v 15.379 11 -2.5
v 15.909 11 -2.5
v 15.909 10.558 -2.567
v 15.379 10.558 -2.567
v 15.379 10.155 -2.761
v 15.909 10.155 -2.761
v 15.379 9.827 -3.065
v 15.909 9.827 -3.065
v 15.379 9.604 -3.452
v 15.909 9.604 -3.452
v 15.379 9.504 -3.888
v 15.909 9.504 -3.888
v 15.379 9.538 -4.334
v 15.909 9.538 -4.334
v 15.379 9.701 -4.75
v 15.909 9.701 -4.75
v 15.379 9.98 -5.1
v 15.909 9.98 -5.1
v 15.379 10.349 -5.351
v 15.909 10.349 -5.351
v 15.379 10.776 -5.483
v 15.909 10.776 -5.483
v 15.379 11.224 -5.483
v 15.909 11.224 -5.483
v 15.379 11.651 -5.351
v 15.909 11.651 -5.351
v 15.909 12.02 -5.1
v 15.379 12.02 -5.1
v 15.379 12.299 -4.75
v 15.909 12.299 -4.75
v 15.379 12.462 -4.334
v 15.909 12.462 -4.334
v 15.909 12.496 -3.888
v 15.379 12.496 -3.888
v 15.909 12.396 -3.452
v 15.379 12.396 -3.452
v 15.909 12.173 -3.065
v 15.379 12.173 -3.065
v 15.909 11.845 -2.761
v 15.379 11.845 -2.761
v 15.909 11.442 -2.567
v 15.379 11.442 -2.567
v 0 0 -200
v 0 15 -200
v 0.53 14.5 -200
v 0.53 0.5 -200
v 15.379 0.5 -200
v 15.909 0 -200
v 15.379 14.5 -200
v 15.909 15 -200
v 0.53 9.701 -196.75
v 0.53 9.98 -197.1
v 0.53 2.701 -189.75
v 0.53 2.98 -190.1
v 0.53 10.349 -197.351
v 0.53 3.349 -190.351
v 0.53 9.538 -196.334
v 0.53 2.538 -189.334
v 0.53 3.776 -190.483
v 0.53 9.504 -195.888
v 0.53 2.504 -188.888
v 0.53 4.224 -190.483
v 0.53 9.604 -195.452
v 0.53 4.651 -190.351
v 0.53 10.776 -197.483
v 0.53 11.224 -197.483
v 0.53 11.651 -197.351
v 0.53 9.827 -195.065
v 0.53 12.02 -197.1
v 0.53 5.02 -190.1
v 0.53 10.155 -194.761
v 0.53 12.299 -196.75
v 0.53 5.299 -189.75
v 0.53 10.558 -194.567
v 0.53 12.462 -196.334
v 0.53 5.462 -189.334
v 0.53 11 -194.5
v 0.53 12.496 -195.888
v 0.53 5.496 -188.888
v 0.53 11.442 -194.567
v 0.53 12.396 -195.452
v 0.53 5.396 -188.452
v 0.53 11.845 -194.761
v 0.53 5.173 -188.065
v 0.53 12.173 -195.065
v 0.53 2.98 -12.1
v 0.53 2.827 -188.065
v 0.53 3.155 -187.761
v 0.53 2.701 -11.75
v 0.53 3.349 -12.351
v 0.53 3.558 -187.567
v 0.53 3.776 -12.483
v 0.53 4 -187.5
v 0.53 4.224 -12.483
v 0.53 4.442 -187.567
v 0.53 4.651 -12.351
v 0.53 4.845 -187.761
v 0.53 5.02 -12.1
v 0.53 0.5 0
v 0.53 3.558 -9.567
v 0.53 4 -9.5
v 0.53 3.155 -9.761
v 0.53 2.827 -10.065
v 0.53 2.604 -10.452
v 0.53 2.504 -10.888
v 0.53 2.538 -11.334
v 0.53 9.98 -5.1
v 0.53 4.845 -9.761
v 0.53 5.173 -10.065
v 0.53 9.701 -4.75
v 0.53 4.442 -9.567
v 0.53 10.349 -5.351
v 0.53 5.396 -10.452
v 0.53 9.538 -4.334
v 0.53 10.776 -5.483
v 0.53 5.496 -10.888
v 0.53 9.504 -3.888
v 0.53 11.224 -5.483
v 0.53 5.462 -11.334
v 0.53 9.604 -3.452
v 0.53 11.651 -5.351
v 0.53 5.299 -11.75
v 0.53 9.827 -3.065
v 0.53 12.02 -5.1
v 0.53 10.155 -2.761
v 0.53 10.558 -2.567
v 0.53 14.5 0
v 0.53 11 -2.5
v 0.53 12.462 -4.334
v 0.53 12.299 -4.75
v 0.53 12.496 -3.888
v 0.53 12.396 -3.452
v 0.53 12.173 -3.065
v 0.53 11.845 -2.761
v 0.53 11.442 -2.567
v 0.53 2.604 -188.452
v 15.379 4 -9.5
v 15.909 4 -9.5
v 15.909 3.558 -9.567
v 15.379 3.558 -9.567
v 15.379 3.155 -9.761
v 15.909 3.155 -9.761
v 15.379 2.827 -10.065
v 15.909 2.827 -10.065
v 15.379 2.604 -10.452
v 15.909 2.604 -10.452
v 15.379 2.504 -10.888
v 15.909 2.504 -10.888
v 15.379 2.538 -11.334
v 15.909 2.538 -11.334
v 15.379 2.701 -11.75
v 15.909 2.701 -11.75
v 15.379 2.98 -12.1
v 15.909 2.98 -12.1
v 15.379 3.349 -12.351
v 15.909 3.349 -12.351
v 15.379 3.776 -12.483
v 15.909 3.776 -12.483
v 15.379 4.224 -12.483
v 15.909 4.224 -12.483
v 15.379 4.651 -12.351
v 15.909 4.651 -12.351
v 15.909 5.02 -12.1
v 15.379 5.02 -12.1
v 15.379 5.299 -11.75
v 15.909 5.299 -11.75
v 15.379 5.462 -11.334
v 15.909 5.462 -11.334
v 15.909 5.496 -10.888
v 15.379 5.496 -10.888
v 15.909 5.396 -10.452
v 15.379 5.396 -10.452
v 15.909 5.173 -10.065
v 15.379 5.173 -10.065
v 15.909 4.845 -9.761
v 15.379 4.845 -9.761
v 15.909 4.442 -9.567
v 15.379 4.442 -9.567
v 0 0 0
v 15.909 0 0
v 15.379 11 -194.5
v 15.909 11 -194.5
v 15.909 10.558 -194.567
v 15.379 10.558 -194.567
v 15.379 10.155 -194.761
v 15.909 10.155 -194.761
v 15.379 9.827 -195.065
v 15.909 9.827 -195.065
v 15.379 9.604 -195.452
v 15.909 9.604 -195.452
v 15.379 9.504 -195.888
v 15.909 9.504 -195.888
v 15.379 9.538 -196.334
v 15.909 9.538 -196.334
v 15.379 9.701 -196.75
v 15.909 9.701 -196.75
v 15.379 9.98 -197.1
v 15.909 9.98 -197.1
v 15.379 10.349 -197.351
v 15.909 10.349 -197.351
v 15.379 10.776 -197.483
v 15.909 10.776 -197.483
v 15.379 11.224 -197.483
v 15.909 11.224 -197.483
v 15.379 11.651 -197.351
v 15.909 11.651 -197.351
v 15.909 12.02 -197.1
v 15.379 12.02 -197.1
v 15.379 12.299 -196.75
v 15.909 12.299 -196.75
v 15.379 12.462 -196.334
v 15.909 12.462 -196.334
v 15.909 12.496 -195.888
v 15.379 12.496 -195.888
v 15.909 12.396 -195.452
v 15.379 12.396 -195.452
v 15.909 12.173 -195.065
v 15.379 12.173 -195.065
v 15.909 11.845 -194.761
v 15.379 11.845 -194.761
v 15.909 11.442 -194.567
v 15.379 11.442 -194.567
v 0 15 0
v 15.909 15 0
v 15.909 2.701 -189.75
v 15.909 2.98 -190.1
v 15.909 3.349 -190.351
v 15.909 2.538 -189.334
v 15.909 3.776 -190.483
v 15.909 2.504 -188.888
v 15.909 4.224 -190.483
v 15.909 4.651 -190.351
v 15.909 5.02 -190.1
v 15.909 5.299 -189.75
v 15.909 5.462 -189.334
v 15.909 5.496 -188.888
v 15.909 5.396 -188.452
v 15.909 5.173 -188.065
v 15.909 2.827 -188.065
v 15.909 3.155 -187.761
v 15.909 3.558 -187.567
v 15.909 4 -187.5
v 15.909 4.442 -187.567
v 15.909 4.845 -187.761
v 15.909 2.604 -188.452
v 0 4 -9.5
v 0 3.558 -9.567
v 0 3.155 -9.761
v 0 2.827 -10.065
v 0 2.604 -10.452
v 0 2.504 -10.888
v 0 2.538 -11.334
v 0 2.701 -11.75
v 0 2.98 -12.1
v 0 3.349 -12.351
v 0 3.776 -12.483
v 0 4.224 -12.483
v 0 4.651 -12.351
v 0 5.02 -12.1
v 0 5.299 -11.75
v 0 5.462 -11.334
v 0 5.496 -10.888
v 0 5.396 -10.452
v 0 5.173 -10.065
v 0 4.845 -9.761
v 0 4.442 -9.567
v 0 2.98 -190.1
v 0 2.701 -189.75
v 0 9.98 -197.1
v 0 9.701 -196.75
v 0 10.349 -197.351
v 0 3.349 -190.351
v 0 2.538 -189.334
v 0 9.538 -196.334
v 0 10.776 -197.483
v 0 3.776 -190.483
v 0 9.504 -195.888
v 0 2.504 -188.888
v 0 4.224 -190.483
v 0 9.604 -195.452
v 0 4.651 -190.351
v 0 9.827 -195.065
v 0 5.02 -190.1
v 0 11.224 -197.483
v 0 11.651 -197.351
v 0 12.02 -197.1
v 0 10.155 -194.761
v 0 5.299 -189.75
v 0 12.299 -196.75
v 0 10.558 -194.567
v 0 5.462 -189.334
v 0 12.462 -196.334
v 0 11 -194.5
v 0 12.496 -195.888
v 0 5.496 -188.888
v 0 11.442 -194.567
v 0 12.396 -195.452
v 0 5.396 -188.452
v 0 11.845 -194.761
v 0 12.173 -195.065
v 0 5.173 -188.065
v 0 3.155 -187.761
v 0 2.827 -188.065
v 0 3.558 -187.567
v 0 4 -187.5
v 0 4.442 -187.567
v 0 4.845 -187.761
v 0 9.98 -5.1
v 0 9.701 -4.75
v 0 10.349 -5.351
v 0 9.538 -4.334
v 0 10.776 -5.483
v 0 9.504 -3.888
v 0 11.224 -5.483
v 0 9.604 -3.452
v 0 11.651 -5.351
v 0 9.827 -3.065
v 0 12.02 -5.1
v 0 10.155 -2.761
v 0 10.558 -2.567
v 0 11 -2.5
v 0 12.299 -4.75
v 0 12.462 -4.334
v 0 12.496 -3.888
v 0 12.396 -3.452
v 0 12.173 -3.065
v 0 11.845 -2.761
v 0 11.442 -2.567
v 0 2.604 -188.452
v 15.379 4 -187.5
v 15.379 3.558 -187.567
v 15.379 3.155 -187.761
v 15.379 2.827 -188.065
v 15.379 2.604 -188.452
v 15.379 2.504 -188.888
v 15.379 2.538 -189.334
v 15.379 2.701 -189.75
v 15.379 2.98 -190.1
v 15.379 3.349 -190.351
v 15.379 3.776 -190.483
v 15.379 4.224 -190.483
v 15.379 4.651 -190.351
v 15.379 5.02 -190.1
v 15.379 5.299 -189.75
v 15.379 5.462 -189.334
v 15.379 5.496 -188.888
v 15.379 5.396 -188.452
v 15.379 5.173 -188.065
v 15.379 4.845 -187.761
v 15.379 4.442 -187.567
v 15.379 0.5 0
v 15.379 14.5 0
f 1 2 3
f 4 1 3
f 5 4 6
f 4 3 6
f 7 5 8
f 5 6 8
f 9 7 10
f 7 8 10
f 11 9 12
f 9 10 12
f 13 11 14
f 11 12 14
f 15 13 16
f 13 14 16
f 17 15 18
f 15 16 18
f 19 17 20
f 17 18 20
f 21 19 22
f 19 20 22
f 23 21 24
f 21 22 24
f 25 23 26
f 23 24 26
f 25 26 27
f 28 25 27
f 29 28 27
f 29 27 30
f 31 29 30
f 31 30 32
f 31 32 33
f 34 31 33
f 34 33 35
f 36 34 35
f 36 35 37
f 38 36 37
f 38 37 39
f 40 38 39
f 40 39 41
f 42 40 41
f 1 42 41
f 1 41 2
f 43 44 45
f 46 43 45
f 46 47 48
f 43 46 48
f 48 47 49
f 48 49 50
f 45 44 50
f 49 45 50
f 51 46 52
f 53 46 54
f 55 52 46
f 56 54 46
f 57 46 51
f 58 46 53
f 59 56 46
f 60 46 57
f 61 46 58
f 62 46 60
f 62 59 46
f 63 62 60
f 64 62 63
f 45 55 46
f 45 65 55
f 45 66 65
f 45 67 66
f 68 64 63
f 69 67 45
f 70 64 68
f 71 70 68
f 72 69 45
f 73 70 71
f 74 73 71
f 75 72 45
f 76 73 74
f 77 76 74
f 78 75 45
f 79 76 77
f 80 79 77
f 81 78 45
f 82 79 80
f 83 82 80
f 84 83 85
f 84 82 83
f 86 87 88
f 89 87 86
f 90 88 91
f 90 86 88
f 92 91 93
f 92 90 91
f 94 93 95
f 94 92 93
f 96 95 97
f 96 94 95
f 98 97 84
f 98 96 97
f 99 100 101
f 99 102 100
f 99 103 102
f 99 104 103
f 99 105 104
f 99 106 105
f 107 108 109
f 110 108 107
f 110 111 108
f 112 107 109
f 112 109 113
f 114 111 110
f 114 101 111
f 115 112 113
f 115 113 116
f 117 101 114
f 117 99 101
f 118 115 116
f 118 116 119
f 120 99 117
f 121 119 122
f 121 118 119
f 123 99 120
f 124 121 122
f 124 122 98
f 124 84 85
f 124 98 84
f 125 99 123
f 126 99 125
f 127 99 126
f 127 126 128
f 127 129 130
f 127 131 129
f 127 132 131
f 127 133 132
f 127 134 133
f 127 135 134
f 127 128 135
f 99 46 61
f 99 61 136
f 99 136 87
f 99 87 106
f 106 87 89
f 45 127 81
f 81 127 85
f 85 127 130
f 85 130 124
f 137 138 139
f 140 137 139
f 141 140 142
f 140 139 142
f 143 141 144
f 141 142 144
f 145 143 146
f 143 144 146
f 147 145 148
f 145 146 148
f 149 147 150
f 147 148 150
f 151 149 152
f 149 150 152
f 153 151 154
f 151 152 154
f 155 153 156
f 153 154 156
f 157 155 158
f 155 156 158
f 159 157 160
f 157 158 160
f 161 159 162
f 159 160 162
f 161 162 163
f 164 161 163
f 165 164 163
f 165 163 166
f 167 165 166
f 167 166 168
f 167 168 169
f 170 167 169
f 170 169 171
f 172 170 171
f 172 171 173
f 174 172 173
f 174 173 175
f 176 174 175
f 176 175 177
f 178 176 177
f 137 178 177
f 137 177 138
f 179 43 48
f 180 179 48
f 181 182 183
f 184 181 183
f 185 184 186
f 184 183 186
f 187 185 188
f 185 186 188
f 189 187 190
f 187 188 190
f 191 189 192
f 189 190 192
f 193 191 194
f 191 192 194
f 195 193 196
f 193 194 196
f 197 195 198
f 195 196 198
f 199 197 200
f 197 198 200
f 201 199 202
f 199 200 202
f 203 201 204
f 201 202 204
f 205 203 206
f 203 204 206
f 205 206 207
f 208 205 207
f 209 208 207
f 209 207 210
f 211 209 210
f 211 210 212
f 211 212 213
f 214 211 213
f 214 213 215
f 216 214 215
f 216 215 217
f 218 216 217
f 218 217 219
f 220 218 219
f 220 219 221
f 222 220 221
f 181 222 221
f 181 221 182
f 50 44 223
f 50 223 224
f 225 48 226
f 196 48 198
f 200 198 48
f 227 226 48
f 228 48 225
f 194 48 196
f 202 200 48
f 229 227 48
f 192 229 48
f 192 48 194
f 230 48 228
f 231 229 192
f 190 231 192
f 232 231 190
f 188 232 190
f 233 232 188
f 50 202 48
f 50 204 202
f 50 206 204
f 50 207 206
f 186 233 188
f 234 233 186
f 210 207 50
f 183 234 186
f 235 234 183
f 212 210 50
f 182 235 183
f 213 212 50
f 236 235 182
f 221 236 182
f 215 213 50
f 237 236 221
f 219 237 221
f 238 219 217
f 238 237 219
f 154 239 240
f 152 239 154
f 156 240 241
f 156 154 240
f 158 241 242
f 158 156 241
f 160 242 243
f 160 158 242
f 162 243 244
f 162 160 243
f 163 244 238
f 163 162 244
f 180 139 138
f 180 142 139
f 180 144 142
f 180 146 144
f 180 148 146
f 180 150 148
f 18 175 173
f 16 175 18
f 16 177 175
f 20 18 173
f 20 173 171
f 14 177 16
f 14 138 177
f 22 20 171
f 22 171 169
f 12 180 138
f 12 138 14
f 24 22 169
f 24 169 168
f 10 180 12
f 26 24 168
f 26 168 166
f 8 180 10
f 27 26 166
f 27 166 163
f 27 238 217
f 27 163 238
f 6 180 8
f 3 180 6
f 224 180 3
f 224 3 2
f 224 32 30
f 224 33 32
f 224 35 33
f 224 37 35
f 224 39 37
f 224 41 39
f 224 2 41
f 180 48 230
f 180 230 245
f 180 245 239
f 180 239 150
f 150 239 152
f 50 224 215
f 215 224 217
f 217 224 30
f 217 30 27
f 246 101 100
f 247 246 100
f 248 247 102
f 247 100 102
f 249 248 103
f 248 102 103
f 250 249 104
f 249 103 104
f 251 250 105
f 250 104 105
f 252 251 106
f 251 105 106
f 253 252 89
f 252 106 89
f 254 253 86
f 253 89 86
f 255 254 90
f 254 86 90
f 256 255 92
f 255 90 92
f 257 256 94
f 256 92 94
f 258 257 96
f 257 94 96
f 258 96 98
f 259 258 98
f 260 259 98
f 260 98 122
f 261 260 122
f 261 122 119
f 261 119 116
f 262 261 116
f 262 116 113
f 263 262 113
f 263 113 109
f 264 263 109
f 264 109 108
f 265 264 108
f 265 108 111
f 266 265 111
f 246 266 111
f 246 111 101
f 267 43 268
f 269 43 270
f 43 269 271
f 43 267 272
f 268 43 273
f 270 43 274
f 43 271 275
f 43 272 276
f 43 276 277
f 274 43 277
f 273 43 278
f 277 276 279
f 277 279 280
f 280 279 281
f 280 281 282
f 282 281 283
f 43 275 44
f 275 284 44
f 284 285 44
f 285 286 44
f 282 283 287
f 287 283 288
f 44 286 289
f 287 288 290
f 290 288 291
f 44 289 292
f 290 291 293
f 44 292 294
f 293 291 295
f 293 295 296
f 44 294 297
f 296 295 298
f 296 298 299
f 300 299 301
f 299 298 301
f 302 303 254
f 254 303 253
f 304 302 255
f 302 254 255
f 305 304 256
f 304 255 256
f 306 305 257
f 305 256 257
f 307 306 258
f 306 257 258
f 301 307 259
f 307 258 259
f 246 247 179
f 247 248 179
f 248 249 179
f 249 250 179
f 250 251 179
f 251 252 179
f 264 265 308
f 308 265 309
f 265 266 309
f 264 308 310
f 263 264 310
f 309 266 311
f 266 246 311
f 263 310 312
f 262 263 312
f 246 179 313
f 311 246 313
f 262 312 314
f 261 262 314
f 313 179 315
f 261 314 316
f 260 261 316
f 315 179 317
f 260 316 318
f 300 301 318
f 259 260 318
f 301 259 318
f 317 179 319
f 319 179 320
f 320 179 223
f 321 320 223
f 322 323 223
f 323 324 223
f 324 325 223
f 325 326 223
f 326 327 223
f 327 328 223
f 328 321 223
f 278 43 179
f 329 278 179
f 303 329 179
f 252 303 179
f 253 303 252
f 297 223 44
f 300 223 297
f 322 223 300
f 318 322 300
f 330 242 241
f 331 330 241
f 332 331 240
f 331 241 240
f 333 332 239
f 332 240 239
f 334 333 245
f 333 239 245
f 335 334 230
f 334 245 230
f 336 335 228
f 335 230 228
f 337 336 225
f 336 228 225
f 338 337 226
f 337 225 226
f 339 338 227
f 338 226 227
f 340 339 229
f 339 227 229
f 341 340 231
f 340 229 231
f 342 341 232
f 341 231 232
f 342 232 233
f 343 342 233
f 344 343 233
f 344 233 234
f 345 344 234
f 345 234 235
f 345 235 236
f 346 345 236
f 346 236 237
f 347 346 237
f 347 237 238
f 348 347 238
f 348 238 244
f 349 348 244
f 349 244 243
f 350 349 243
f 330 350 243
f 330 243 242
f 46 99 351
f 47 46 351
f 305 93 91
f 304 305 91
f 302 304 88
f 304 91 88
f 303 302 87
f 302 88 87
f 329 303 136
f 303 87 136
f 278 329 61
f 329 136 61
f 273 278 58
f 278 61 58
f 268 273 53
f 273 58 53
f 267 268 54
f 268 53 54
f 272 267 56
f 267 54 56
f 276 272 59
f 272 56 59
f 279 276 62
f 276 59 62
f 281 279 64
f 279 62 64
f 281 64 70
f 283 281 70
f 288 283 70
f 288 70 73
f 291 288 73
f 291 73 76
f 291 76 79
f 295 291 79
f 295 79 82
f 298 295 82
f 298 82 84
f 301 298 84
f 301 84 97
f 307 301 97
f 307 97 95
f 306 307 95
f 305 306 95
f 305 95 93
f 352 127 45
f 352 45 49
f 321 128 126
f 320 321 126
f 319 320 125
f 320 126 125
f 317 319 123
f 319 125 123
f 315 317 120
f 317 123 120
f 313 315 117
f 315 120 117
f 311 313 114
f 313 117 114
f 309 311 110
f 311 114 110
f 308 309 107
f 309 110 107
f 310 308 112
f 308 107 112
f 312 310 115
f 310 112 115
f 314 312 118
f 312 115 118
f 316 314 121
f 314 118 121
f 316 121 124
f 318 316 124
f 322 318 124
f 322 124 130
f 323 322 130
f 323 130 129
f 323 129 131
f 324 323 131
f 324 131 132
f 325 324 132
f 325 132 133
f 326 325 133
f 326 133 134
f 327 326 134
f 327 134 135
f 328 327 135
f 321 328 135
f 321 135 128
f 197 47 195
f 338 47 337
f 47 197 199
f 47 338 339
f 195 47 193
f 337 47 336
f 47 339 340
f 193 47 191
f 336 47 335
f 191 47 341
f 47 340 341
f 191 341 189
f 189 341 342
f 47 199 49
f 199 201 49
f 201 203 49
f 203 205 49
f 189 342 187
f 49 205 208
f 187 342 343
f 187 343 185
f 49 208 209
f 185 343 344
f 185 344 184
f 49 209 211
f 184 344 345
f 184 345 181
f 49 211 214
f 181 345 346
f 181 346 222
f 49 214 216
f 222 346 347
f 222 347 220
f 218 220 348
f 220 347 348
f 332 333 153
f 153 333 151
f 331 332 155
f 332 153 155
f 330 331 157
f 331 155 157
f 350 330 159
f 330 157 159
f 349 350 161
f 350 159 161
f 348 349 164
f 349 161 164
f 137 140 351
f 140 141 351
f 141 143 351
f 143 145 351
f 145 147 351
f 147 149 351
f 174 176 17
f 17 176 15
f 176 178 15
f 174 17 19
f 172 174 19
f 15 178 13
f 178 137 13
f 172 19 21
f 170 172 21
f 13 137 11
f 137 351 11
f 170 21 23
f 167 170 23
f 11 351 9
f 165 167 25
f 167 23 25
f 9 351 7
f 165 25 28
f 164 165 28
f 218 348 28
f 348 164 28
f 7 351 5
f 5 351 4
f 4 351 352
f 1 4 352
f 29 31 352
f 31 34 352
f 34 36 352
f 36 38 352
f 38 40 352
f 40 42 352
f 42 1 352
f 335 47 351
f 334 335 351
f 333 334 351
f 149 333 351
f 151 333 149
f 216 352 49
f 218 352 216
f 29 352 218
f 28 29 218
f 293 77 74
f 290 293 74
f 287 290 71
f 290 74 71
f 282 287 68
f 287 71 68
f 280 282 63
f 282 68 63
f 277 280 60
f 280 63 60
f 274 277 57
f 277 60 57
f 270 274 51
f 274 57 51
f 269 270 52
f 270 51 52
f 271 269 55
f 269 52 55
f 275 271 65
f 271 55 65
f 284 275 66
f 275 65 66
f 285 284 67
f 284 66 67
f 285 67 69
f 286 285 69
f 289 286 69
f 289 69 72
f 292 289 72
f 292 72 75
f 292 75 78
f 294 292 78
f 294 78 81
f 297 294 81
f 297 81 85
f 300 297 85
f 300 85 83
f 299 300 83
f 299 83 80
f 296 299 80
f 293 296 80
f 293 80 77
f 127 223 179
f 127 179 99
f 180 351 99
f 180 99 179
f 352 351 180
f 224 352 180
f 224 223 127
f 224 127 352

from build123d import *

# Parameters (mm, degrees)
ESQUISSE1_W             = 15.90910635
ESQUISSE1_H             = 15
ESQUISSE1_W_2           = 14.84849926
ESQUISSE1_H_2           = 14
BOSS_EXTRU_1_DEPTH      = 200
ESQUISSE6_R             = 1.5
ENL_V_MAT_EXTRU_7_DEPTH = 20


with BuildPart() as part:
    # Esquisse1 → Boss.-Extru.1 (new body)
    with BuildSketch(Plane.XY):
        with Locations((7.954553175, 7.5)):
            Rectangle(ESQUISSE1_W, ESQUISSE1_H)
        with Locations((7.954553175, 7.5)):
            Rectangle(ESQUISSE1_W_2, ESQUISSE1_H_2, mode=Mode.SUBTRACT)
    extrude(amount=-BOSS_EXTRU_1_DEPTH)

    # Esquisse6 → Enlèv. mat.-Extru.7 (cut)
    with BuildSketch(Plane(origin=(15.90910635, 0, 0), x_dir=(0, 0, -1), z_dir=(1, 0, 0))):
        with Locations(Location((4, 11, 0), (0, 0, 180))):
            Circle(ESQUISSE6_R)
        with Locations(Location((11, 4, 0), (0, 0, 180))):
            Circle(ESQUISSE6_R)
        with Locations(Location((189, 4, 0), (0, 0, 180))):
            Circle(ESQUISSE6_R)
        with Locations(Location((196, 11, 0), (0, 0, 180))):
            Circle(ESQUISSE6_R)
    extrude(amount=-ENL_V_MAT_EXTRU_7_DEPTH, mode=Mode.SUBTRACT)


solid = part.part
